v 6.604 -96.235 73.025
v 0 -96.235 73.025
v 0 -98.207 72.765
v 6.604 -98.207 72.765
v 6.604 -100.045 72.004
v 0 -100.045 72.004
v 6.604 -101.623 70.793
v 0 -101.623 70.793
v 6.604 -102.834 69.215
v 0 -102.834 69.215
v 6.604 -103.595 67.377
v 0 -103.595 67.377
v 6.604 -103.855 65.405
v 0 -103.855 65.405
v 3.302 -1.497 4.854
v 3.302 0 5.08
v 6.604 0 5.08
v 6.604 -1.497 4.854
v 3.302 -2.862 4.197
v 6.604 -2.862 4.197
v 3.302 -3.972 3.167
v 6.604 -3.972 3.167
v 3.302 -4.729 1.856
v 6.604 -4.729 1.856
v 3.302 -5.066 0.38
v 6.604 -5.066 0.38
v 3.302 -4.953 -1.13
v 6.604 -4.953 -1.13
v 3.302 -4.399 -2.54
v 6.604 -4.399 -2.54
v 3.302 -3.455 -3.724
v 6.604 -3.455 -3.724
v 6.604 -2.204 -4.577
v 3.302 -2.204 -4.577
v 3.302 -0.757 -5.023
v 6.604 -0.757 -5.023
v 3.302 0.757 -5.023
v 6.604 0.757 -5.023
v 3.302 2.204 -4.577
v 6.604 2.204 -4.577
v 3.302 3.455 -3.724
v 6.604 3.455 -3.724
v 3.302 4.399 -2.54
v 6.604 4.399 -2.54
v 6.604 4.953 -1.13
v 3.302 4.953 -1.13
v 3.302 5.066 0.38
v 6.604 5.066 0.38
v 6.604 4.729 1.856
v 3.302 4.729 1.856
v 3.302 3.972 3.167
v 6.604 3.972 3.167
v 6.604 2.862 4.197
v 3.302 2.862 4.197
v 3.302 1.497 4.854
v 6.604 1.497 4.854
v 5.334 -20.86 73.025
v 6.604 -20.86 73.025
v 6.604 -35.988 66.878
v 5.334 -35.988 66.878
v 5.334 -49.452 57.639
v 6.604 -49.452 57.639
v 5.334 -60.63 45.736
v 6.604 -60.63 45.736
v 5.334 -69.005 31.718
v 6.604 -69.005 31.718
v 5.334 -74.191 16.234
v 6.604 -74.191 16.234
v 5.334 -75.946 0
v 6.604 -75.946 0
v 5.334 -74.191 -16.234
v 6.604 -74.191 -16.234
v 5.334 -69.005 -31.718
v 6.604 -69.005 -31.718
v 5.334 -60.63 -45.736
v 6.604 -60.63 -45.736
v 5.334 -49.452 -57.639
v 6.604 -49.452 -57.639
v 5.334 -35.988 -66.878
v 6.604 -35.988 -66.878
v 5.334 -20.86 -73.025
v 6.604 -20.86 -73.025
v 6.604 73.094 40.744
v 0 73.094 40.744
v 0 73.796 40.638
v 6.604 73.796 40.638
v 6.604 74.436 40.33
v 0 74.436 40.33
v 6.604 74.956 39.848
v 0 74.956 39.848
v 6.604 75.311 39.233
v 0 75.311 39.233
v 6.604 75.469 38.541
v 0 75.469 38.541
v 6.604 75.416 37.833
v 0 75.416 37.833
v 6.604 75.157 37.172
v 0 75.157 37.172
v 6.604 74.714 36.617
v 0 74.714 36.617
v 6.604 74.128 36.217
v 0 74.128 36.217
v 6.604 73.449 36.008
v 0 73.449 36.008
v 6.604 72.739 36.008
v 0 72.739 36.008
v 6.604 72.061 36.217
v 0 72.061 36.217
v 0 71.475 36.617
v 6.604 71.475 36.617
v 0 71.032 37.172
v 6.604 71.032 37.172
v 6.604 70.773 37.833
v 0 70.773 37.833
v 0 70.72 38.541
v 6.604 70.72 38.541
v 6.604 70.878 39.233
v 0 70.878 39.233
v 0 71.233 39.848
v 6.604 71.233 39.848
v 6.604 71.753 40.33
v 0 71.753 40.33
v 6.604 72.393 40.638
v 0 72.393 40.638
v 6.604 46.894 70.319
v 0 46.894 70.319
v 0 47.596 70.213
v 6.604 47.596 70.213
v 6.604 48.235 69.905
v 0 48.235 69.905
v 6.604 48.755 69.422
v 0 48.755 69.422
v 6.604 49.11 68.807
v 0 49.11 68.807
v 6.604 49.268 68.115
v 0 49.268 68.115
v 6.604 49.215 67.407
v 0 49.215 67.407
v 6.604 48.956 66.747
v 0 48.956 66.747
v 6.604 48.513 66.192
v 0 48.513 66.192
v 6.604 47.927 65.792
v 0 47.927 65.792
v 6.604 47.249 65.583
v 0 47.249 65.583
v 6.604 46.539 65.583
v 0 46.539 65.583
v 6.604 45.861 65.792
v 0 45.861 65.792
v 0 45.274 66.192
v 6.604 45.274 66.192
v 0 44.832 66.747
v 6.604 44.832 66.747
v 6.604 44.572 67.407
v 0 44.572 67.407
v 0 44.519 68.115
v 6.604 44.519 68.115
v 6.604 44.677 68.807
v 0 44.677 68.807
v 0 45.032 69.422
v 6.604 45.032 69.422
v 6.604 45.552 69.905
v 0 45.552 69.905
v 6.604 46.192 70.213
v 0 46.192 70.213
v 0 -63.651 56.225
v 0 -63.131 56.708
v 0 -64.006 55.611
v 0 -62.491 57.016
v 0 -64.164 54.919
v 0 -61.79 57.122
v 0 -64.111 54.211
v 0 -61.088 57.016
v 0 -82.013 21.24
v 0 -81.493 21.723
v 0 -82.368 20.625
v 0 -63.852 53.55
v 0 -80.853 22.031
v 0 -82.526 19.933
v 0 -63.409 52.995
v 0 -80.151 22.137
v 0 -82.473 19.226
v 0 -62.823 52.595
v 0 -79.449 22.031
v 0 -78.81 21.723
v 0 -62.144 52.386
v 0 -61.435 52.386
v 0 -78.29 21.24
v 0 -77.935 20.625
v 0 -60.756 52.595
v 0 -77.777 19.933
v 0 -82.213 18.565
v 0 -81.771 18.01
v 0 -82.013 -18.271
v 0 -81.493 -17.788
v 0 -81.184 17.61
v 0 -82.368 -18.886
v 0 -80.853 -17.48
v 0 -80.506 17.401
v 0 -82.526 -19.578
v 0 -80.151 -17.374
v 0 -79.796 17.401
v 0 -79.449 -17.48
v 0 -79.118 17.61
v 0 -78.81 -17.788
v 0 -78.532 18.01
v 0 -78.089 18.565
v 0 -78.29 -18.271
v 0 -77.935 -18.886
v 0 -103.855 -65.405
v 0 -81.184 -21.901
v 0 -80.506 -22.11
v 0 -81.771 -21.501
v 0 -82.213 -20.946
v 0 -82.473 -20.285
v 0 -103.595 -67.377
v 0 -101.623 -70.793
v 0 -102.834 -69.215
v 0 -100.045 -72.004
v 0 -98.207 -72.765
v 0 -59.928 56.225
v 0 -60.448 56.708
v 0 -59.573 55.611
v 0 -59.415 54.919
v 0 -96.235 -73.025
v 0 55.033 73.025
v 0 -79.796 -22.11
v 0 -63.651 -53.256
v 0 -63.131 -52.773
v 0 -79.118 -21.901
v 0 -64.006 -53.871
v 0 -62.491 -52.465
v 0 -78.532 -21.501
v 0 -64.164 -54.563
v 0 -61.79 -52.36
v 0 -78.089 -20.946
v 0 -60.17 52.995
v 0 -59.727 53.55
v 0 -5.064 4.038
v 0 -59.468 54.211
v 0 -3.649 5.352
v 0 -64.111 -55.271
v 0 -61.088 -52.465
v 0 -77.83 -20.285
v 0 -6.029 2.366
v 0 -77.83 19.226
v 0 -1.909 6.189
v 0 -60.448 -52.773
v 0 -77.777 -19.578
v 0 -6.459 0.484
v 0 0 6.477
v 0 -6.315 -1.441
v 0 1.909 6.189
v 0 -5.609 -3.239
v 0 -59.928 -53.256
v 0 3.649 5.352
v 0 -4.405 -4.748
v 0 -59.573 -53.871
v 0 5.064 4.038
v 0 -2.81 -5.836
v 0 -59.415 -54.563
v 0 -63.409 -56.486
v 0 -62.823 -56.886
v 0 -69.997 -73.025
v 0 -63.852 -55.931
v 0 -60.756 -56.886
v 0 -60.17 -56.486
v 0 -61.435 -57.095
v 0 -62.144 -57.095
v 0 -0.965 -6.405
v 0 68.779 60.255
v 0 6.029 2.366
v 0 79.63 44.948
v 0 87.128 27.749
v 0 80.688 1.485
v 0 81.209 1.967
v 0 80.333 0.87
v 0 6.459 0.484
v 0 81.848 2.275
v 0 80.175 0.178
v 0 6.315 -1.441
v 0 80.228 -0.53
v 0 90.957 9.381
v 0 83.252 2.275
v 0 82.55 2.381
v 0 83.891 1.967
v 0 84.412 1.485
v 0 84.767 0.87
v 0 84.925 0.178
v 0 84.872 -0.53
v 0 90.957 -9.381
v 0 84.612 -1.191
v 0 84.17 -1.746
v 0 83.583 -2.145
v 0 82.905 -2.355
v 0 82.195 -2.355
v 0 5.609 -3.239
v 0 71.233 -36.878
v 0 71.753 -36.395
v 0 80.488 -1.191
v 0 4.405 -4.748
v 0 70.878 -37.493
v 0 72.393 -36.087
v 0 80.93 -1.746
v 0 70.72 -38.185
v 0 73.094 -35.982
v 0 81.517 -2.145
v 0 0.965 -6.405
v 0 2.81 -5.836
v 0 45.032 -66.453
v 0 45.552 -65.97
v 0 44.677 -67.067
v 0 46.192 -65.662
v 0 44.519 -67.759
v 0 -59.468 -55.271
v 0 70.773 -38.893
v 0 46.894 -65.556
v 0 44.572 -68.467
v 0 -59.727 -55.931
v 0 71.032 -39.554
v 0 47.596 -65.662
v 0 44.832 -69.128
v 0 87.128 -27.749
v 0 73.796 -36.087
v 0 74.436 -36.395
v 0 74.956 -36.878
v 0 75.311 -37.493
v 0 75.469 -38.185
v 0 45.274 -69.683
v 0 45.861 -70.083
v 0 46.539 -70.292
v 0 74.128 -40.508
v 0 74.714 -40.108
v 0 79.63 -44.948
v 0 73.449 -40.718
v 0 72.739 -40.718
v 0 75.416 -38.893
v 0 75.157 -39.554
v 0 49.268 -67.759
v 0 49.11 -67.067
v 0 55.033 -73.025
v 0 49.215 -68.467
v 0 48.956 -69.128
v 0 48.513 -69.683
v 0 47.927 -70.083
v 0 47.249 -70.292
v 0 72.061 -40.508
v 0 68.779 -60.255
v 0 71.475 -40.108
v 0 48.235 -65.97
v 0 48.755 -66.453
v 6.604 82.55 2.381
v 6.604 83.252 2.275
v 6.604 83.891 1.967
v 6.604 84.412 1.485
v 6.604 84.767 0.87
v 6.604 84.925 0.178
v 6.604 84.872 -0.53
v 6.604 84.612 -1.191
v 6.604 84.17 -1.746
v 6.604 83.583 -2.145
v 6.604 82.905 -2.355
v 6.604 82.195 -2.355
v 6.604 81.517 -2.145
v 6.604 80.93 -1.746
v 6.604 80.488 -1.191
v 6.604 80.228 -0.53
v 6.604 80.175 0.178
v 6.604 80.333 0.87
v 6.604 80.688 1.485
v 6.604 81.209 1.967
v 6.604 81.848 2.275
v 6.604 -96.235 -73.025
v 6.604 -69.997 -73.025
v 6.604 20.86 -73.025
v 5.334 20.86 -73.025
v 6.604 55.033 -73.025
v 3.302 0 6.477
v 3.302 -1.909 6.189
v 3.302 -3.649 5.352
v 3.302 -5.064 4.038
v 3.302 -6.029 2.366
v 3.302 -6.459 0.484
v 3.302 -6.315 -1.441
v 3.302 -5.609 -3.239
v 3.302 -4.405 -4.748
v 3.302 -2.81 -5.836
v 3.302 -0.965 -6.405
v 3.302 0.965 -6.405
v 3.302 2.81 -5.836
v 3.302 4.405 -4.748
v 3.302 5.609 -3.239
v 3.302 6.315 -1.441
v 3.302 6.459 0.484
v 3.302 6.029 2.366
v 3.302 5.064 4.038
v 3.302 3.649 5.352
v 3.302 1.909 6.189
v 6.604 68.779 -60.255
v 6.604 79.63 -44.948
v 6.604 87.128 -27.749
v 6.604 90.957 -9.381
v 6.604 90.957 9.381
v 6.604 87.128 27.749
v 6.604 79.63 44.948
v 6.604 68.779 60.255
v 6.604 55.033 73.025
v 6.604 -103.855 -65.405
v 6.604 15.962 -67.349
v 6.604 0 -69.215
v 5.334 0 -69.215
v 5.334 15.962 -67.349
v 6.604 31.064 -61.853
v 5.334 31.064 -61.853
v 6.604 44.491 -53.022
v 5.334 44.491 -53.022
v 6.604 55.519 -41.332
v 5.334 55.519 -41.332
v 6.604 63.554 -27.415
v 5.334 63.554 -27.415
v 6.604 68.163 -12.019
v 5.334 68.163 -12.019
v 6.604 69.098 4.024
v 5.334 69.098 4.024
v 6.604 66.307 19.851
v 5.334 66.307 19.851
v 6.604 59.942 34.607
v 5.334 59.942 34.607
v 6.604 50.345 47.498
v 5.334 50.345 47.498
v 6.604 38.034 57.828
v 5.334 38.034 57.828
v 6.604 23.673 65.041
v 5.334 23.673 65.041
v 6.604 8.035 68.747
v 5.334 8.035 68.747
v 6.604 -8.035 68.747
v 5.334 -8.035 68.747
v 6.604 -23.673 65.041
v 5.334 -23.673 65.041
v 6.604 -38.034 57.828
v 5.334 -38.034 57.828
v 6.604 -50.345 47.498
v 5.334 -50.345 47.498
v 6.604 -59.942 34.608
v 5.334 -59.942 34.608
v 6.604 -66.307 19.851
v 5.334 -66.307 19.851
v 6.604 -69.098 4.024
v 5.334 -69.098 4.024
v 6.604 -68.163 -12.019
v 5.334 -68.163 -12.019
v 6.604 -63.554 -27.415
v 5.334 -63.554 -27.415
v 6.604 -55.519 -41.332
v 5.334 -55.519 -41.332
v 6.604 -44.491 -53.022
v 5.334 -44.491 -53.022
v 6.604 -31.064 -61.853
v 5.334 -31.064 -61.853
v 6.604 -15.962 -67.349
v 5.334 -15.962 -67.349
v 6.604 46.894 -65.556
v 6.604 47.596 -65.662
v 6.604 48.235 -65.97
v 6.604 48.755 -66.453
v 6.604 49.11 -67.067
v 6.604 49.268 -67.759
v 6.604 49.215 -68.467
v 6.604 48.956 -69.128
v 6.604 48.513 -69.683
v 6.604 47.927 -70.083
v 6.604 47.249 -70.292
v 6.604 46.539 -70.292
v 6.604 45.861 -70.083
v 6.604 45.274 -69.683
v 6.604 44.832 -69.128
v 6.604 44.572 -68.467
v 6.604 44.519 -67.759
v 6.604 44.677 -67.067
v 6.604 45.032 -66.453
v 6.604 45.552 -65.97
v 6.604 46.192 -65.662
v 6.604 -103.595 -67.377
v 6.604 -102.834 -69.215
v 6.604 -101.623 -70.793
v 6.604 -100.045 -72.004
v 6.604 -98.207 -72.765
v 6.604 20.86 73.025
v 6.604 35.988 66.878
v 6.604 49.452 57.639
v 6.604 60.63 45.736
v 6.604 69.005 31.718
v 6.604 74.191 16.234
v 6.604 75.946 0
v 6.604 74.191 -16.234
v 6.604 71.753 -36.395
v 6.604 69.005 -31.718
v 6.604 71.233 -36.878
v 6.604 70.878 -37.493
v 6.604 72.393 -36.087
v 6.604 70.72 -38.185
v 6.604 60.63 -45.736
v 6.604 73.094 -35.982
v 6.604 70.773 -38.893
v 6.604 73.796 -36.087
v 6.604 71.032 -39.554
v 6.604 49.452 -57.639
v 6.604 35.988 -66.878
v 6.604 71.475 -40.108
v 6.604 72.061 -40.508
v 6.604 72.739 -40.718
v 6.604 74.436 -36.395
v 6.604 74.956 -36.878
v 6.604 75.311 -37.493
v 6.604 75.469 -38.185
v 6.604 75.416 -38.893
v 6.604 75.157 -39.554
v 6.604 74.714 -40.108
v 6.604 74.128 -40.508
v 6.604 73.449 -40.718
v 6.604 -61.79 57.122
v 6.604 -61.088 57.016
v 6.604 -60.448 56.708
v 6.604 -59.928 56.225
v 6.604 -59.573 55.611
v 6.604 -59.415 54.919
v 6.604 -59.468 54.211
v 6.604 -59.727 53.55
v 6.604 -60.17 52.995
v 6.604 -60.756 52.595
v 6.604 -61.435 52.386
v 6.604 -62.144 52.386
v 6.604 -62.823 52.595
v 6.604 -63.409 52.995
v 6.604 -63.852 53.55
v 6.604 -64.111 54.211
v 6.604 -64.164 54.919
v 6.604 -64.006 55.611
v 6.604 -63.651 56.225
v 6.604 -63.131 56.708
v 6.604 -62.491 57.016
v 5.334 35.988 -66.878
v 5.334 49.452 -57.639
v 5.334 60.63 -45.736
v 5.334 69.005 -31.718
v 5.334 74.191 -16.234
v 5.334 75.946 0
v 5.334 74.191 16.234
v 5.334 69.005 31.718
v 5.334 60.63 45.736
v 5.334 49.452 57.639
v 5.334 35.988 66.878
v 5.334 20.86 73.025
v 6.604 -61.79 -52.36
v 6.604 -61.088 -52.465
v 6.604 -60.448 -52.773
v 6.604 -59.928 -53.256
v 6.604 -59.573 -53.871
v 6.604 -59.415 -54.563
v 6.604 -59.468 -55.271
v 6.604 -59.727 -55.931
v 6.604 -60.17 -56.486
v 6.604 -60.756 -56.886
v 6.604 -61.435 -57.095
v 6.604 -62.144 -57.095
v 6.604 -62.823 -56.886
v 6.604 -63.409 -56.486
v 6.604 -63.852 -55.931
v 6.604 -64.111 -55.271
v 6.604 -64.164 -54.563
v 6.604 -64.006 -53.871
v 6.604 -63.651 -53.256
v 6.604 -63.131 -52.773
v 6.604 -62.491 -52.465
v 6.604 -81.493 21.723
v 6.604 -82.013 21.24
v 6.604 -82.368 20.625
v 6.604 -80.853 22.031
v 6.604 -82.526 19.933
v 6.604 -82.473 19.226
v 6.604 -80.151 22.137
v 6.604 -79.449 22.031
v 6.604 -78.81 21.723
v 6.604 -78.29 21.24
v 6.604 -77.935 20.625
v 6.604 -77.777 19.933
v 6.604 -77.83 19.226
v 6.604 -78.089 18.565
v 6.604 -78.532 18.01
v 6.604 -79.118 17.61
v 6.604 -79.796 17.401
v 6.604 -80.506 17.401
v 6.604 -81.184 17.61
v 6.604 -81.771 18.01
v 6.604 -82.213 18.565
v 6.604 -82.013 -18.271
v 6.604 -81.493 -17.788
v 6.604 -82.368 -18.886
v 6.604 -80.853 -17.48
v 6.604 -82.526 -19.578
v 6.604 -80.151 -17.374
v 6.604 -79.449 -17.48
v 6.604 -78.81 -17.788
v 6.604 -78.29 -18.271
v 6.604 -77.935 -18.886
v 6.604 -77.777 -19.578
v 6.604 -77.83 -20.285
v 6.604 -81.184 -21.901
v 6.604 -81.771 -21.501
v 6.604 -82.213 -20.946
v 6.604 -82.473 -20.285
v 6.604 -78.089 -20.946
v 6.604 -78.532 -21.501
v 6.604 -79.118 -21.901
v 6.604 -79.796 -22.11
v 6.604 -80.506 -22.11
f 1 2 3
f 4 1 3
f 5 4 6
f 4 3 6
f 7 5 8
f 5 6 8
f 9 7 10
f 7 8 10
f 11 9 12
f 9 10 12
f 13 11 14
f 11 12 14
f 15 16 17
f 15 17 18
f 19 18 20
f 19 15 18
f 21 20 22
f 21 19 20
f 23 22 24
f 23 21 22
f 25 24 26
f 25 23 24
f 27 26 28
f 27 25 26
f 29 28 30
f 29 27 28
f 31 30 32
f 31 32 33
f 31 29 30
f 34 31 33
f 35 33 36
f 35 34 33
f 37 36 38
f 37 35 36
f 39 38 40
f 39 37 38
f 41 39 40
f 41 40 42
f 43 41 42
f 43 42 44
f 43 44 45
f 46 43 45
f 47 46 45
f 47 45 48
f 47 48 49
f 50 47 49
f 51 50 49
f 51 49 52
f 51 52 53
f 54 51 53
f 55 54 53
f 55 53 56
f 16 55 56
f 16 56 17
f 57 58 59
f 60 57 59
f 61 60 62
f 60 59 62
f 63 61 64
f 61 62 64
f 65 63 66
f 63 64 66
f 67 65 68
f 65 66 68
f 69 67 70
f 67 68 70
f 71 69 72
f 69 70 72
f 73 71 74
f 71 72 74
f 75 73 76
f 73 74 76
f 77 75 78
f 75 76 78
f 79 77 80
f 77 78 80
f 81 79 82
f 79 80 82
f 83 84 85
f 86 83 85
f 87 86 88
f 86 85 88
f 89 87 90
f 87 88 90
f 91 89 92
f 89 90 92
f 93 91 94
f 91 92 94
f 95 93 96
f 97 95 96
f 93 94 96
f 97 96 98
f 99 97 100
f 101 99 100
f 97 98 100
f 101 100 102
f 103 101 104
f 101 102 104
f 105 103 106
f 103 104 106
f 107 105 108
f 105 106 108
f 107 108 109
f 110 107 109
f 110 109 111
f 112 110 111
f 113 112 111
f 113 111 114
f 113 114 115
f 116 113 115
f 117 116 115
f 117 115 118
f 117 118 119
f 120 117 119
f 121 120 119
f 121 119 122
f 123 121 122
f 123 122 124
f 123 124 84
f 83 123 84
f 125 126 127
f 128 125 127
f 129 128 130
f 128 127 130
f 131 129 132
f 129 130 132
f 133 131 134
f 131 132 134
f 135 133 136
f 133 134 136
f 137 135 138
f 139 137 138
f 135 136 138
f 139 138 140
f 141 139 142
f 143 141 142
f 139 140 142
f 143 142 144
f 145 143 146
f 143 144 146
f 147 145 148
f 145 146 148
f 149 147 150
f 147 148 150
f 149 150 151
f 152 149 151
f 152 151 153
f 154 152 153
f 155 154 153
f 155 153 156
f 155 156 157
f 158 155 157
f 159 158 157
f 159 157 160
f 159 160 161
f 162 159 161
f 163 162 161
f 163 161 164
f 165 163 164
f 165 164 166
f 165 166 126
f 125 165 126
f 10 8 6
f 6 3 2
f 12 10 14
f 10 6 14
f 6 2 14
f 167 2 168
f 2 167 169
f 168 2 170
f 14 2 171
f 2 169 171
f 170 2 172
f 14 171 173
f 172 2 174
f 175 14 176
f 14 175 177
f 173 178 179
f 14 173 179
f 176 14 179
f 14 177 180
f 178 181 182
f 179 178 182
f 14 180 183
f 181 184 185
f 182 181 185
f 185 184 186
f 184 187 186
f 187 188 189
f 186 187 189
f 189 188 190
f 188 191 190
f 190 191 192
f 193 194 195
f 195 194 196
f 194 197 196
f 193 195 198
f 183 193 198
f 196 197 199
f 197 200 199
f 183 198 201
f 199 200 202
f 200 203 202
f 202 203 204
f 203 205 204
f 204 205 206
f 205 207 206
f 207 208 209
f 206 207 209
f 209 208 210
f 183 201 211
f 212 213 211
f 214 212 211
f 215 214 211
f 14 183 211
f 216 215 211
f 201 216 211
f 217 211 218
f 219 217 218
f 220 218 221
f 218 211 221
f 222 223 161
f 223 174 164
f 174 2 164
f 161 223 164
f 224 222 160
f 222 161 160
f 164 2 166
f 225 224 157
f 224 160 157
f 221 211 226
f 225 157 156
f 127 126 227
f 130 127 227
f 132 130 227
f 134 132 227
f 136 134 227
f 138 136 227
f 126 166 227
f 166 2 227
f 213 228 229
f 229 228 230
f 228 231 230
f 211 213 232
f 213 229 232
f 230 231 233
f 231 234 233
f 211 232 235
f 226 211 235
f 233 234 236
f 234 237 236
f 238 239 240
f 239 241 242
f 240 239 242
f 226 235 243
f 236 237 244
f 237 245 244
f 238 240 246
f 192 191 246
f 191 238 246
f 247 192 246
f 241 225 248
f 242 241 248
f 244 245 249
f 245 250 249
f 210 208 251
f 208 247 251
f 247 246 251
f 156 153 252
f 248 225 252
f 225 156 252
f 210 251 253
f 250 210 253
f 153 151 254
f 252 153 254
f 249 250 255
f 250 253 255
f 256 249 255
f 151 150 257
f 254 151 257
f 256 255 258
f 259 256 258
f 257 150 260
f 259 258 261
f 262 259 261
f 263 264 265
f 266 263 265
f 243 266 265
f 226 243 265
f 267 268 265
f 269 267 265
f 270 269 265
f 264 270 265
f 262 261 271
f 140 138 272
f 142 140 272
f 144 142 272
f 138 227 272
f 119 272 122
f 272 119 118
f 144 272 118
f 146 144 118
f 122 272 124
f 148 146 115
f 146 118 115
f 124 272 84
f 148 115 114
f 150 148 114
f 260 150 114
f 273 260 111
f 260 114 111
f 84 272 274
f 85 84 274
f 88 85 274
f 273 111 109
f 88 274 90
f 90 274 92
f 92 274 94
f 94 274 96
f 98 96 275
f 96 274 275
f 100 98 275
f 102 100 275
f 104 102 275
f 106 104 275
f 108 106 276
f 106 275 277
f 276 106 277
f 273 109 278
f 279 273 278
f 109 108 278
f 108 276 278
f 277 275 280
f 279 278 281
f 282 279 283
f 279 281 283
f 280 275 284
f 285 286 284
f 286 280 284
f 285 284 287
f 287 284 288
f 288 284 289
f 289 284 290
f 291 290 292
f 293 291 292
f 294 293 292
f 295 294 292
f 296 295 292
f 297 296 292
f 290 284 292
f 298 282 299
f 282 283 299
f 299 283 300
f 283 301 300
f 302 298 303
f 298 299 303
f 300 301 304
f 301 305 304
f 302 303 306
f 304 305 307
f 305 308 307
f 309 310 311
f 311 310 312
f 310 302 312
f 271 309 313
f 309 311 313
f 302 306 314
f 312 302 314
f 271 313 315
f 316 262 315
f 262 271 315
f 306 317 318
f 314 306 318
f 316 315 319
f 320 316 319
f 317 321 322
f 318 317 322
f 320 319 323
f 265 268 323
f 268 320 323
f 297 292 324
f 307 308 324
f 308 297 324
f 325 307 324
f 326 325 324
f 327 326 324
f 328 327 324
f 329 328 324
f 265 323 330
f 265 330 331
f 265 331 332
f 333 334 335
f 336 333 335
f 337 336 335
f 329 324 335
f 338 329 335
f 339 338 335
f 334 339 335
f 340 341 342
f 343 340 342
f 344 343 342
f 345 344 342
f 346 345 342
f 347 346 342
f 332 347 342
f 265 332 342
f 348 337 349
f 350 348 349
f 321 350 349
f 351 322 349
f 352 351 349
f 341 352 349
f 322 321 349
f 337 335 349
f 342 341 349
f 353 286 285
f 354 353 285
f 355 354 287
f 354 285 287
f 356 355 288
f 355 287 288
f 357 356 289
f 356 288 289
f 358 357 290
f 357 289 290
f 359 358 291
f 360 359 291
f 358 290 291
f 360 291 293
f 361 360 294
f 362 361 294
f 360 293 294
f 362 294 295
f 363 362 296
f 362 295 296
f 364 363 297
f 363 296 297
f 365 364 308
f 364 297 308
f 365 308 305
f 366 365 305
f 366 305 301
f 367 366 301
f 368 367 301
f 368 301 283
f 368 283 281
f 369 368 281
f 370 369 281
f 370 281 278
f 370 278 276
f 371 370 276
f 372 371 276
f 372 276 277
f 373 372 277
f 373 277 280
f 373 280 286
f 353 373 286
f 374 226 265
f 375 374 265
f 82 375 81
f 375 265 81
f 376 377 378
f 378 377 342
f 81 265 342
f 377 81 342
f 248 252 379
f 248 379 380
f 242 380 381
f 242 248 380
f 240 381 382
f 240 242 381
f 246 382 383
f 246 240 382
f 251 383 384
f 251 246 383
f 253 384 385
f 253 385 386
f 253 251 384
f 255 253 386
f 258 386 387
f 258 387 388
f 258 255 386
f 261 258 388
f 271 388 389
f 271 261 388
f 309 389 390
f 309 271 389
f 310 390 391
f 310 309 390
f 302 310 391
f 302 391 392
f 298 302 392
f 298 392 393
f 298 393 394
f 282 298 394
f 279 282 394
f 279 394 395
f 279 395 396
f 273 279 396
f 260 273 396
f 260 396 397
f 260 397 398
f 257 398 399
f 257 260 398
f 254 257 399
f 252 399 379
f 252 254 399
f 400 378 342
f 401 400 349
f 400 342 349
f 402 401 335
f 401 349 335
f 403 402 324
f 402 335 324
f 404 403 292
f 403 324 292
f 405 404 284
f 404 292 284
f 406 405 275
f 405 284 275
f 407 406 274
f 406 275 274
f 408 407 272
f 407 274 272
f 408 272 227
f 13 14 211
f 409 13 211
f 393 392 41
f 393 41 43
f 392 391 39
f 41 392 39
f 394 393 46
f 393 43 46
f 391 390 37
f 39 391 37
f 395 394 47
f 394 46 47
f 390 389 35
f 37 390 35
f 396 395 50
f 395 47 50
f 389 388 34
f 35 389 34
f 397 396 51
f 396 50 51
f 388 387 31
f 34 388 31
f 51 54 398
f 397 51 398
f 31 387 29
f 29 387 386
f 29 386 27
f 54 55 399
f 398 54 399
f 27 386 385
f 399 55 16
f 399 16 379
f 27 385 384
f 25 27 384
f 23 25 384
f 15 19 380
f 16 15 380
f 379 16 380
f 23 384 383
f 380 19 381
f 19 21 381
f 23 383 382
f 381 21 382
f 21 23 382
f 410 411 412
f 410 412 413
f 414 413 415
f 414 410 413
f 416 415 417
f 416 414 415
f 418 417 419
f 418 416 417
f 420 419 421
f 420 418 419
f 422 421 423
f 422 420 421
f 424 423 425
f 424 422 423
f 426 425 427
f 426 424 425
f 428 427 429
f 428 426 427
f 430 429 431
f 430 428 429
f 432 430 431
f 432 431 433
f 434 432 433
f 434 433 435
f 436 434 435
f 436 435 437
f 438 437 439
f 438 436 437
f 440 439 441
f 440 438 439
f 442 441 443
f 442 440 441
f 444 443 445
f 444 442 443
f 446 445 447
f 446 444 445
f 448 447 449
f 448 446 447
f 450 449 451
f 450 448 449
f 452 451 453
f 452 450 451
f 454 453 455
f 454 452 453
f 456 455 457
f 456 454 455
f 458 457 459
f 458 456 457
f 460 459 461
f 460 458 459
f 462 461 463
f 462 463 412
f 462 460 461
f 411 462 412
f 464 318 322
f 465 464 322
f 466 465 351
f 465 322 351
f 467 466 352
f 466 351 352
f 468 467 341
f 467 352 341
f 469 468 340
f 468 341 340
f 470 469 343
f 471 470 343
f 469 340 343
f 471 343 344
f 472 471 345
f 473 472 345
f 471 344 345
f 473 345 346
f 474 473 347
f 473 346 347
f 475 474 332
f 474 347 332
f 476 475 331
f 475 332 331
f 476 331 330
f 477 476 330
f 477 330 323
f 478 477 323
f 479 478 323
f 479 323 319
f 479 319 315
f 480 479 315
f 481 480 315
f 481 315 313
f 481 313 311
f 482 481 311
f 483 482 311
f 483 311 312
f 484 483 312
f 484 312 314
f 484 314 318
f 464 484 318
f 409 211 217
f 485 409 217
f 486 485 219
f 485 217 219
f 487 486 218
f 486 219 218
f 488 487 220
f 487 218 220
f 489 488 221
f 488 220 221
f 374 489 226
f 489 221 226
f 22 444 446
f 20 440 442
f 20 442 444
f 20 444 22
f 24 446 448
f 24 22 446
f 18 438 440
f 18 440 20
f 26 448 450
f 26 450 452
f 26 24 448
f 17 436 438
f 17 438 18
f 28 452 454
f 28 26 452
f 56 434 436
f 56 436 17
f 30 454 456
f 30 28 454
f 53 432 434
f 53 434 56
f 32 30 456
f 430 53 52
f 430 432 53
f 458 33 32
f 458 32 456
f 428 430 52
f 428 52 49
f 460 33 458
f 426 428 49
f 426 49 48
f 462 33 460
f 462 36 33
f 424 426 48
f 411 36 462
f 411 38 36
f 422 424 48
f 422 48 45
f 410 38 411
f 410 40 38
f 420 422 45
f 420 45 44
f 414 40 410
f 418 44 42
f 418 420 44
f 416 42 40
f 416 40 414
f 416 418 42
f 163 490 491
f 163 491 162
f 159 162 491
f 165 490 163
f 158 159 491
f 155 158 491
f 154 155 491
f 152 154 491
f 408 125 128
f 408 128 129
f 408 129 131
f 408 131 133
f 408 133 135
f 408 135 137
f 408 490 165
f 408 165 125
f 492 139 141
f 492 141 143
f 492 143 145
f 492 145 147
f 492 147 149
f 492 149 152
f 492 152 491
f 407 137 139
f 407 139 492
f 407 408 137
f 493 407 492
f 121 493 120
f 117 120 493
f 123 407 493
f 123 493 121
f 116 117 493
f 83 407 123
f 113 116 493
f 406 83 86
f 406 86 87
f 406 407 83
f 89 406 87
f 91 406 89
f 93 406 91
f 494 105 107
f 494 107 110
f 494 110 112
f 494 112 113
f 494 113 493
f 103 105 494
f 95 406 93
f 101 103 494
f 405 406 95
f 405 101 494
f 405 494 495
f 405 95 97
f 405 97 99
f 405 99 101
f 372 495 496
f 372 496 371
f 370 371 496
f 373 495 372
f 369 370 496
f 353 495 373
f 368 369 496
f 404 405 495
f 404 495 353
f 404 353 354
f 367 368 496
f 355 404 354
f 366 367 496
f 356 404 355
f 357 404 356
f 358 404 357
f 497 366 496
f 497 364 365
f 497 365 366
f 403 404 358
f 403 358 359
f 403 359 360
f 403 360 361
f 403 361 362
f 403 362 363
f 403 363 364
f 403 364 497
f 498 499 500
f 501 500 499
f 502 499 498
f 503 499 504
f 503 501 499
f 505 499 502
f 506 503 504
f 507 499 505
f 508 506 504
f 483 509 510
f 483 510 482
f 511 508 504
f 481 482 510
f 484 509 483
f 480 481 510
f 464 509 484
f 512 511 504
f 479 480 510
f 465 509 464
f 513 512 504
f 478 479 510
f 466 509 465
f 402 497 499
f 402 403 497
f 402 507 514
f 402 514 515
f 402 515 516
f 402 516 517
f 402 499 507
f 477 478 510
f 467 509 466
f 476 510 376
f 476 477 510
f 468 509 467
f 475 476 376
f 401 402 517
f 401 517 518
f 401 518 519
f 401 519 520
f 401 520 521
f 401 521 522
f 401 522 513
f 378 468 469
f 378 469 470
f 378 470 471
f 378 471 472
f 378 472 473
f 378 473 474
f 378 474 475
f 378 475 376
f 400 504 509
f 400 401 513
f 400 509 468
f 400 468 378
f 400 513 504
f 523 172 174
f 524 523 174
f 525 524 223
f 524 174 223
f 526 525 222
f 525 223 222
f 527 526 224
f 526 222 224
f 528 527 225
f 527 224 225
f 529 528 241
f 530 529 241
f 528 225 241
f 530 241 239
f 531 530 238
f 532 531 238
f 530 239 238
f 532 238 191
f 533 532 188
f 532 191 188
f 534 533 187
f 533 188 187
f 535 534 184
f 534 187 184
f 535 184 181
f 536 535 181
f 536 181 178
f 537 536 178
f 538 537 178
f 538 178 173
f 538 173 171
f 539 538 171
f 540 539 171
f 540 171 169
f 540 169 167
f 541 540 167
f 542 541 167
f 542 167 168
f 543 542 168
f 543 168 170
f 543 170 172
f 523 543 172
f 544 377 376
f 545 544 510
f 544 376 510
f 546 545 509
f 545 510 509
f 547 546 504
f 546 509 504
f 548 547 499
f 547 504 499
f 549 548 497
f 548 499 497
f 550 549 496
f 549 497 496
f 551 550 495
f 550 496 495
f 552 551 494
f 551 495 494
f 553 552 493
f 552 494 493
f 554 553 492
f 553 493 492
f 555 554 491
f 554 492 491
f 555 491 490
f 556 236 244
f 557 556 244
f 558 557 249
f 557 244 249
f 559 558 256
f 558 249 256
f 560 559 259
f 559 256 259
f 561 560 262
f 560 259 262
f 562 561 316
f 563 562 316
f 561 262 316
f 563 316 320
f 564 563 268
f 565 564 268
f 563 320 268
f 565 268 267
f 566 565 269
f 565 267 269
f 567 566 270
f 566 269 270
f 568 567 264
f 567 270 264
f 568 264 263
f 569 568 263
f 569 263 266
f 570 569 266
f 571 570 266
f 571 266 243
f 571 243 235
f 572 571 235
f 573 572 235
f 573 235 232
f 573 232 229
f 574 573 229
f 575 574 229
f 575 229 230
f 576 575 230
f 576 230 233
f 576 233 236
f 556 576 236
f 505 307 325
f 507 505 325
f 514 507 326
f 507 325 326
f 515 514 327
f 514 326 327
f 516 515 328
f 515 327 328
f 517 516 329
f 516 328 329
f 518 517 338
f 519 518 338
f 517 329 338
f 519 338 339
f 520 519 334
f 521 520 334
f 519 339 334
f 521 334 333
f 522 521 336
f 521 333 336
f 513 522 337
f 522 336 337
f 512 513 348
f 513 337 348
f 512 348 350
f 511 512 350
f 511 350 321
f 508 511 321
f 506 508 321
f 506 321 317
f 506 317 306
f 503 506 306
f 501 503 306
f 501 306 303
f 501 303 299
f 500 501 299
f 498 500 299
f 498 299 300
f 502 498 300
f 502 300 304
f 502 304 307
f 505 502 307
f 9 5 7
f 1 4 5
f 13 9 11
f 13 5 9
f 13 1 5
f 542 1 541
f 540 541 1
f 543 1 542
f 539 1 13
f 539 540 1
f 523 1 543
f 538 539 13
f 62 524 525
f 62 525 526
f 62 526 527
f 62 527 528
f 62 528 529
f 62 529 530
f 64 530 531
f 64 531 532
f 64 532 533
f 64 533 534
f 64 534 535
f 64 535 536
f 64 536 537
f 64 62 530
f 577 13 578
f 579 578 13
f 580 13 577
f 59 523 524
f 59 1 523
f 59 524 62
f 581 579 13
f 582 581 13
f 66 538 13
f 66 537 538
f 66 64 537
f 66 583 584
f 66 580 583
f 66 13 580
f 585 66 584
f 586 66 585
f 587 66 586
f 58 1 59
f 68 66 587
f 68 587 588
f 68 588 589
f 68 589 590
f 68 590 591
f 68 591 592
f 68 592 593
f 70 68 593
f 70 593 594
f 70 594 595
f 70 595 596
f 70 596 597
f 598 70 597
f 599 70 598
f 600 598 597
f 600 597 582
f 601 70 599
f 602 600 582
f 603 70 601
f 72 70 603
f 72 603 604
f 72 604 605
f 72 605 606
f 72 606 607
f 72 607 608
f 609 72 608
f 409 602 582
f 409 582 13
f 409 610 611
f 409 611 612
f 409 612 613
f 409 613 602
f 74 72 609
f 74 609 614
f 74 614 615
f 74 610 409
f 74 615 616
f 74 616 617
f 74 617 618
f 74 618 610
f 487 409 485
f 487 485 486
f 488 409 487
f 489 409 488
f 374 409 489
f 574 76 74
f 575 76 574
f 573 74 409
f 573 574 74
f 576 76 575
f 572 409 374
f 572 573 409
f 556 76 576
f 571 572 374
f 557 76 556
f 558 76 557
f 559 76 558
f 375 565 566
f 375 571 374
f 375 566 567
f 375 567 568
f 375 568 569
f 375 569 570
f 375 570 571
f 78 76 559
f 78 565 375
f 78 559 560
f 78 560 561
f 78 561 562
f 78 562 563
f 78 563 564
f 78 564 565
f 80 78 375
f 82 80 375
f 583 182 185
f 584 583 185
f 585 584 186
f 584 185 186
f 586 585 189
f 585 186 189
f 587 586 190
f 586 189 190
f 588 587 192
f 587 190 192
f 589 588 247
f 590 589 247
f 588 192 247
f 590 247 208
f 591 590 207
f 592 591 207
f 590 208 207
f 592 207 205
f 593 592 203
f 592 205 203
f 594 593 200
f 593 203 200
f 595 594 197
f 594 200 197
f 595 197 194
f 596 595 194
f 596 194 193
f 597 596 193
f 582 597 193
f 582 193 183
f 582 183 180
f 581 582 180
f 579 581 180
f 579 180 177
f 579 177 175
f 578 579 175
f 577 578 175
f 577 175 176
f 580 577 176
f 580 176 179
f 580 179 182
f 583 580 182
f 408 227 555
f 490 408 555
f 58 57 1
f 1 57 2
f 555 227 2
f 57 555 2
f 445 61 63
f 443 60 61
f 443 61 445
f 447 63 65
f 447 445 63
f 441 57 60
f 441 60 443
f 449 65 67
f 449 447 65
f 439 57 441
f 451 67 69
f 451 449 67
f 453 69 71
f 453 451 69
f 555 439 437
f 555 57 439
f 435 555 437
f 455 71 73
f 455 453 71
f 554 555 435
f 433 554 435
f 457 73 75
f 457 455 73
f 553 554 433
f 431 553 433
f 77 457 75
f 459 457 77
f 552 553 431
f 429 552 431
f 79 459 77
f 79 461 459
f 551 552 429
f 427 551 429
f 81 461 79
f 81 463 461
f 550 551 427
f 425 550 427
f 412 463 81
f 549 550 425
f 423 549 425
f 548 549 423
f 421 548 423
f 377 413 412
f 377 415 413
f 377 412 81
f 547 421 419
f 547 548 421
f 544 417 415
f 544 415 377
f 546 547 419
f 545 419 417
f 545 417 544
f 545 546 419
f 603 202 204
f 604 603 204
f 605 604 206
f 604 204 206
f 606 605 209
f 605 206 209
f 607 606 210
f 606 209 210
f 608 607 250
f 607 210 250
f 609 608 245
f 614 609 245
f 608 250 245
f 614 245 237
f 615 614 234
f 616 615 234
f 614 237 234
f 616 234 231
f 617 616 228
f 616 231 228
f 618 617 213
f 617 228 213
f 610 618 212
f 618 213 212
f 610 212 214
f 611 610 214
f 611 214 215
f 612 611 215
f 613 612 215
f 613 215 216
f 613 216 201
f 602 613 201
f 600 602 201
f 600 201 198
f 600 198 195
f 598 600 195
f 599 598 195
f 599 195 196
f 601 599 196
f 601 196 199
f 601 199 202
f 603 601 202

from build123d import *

# Parameters (mm, degrees)
SKETCH1_R           = 5.08
BOSS_EXTRUDE1_DEPTH = 6.604
SKETCH2_R           = 6.477
CUT_EXTRUDE1_DEPTH  = 3.302
SKETCH3_R           = 75.946
SKETCH3_R_2         = 69.215
CUT_EXTRUDE2_DEPTH  = 1.27
SKETCH4_R           = 2.38125
CUT_EXTRUDE3_DEPTH  = 139.530727768
SKETCH6_W           = 37.512644612
SKETCH6_H           = 125.02997604
SKETCH6_W_2         = 29.936636925
CUT_EXTRUDE6_DEPTH  = 139.530727768


with BuildPart() as part:
    # Sketch1 → Boss-Extrude1 (new body)
    with BuildSketch(Plane(origin=(0, 0, 0), x_dir=(0, 0, -1), z_dir=(1, 0, 0))):
        with BuildLine():
            Line((-65.405, -103.855072673), (65.405, -103.855072673))
            ThreePointArc((65.405, -103.855072673), (70.793153673, -101.623226346), (73.025, -96.235072673))
            Line((73.025, -96.235072673), (73.025, -69.997049759))
            ThreePointArc((73.025, -69.997049759), (74.696702219, -57.072253546), (79.601785714, -44.998103417))
            ThreePointArc((79.601785714, -44.998103417), (0, 91.44), (-79.601785714, -44.998103417))
            ThreePointArc((-79.601785714, -44.998103417), (-74.696702219, -57.072253546), (-73.025, -69.997049759))
            Line((-73.025, -69.997049759), (-73.025, -96.235072673))
            ThreePointArc((-73.025, -96.235072673), (-70.793153673, -101.623226346), (-65.405, -103.855072673))
        make_face()
        with Locations(Location((0, 0, 0), (0, 0, 180))):
            Circle(SKETCH1_R, mode=Mode.SUBTRACT)
    extrude(amount=BOSS_EXTRUDE1_DEPTH)

    # Sketch2 → Cut-Extrude1 (cut)
    with BuildSketch(Plane(origin=(0, 0, 0), x_dir=(0, 0, -1), z_dir=(1, 0, 0))):
        with Locations(Location((0, 0, 0), (0, 0, 180))):
            Circle(SKETCH2_R)
    extrude(amount=CUT_EXTRUDE1_DEPTH, mode=Mode.SUBTRACT)

    # Sketch3 → Cut-Extrude2 (cut)
    with BuildSketch(Plane(origin=(6.604, 0, 0), x_dir=(0, 0, -1), z_dir=(1, 0, 0))):
        Circle(SKETCH3_R)
        Circle(SKETCH3_R_2, mode=Mode.SUBTRACT)
    extrude(amount=-CUT_EXTRUDE2_DEPTH, mode=Mode.SUBTRACT)

    # Sketch4 → Cut-Extrude3 (cut, through all)
    with BuildSketch(Plane.ZY):
        with Locations((-54.740775438, -61.789562262)):
            Circle(SKETCH4_R)
        with Locations((0, 82.55)):
            Circle(SKETCH4_R)
        with Locations((-77.185590834, -29.272633425)):
            Circle(SKETCH4_R)
        with Locations((38.362897852, 73.094394918)):
            Circle(SKETCH4_R)
        with Locations((67.93731813, 46.893744843)):
            Circle(SKETCH4_R)
        with Locations((81.948117557, 9.950302955)):
            Circle(SKETCH4_R)
        with Locations((77.185590834, -29.272633425)):
            Circle(SKETCH4_R)
        with Locations((54.740775438, -61.789562262)):
            Circle(SKETCH4_R)
        with Locations((19.755508087, -80.151247029)):
            Circle(SKETCH4_R)
        with Locations((-19.755508087, -80.151247029)):
            Circle(SKETCH4_R)
        with Locations((-81.948117557, 9.950302955)):
            Circle(SKETCH4_R)
        with Locations((-67.93731813, 46.893744843)):
            Circle(SKETCH4_R)
        with Locations((-38.362897852, 73.094394918)):
            Circle(SKETCH4_R)
    extrude(amount=-CUT_EXTRUDE3_DEPTH, mode=Mode.SUBTRACT)

    # Sketch6 → Cut-Extrude6 (cut, through all)
    with BuildSketch(Plane(origin=(6.604, 0, 0), x_dir=(0, 0, -1), z_dir=(1, 0, 0))):
        with Locations((-91.781322306, -7.482061739)):
            Rectangle(SKETCH6_W, SKETCH6_H)
        with Locations((87.993318463, -7.482061739)):
            Rectangle(SKETCH6_W_2, SKETCH6_H)
    extrude(amount=-CUT_EXTRUDE6_DEPTH, mode=Mode.SUBTRACT)


solid = part.part
